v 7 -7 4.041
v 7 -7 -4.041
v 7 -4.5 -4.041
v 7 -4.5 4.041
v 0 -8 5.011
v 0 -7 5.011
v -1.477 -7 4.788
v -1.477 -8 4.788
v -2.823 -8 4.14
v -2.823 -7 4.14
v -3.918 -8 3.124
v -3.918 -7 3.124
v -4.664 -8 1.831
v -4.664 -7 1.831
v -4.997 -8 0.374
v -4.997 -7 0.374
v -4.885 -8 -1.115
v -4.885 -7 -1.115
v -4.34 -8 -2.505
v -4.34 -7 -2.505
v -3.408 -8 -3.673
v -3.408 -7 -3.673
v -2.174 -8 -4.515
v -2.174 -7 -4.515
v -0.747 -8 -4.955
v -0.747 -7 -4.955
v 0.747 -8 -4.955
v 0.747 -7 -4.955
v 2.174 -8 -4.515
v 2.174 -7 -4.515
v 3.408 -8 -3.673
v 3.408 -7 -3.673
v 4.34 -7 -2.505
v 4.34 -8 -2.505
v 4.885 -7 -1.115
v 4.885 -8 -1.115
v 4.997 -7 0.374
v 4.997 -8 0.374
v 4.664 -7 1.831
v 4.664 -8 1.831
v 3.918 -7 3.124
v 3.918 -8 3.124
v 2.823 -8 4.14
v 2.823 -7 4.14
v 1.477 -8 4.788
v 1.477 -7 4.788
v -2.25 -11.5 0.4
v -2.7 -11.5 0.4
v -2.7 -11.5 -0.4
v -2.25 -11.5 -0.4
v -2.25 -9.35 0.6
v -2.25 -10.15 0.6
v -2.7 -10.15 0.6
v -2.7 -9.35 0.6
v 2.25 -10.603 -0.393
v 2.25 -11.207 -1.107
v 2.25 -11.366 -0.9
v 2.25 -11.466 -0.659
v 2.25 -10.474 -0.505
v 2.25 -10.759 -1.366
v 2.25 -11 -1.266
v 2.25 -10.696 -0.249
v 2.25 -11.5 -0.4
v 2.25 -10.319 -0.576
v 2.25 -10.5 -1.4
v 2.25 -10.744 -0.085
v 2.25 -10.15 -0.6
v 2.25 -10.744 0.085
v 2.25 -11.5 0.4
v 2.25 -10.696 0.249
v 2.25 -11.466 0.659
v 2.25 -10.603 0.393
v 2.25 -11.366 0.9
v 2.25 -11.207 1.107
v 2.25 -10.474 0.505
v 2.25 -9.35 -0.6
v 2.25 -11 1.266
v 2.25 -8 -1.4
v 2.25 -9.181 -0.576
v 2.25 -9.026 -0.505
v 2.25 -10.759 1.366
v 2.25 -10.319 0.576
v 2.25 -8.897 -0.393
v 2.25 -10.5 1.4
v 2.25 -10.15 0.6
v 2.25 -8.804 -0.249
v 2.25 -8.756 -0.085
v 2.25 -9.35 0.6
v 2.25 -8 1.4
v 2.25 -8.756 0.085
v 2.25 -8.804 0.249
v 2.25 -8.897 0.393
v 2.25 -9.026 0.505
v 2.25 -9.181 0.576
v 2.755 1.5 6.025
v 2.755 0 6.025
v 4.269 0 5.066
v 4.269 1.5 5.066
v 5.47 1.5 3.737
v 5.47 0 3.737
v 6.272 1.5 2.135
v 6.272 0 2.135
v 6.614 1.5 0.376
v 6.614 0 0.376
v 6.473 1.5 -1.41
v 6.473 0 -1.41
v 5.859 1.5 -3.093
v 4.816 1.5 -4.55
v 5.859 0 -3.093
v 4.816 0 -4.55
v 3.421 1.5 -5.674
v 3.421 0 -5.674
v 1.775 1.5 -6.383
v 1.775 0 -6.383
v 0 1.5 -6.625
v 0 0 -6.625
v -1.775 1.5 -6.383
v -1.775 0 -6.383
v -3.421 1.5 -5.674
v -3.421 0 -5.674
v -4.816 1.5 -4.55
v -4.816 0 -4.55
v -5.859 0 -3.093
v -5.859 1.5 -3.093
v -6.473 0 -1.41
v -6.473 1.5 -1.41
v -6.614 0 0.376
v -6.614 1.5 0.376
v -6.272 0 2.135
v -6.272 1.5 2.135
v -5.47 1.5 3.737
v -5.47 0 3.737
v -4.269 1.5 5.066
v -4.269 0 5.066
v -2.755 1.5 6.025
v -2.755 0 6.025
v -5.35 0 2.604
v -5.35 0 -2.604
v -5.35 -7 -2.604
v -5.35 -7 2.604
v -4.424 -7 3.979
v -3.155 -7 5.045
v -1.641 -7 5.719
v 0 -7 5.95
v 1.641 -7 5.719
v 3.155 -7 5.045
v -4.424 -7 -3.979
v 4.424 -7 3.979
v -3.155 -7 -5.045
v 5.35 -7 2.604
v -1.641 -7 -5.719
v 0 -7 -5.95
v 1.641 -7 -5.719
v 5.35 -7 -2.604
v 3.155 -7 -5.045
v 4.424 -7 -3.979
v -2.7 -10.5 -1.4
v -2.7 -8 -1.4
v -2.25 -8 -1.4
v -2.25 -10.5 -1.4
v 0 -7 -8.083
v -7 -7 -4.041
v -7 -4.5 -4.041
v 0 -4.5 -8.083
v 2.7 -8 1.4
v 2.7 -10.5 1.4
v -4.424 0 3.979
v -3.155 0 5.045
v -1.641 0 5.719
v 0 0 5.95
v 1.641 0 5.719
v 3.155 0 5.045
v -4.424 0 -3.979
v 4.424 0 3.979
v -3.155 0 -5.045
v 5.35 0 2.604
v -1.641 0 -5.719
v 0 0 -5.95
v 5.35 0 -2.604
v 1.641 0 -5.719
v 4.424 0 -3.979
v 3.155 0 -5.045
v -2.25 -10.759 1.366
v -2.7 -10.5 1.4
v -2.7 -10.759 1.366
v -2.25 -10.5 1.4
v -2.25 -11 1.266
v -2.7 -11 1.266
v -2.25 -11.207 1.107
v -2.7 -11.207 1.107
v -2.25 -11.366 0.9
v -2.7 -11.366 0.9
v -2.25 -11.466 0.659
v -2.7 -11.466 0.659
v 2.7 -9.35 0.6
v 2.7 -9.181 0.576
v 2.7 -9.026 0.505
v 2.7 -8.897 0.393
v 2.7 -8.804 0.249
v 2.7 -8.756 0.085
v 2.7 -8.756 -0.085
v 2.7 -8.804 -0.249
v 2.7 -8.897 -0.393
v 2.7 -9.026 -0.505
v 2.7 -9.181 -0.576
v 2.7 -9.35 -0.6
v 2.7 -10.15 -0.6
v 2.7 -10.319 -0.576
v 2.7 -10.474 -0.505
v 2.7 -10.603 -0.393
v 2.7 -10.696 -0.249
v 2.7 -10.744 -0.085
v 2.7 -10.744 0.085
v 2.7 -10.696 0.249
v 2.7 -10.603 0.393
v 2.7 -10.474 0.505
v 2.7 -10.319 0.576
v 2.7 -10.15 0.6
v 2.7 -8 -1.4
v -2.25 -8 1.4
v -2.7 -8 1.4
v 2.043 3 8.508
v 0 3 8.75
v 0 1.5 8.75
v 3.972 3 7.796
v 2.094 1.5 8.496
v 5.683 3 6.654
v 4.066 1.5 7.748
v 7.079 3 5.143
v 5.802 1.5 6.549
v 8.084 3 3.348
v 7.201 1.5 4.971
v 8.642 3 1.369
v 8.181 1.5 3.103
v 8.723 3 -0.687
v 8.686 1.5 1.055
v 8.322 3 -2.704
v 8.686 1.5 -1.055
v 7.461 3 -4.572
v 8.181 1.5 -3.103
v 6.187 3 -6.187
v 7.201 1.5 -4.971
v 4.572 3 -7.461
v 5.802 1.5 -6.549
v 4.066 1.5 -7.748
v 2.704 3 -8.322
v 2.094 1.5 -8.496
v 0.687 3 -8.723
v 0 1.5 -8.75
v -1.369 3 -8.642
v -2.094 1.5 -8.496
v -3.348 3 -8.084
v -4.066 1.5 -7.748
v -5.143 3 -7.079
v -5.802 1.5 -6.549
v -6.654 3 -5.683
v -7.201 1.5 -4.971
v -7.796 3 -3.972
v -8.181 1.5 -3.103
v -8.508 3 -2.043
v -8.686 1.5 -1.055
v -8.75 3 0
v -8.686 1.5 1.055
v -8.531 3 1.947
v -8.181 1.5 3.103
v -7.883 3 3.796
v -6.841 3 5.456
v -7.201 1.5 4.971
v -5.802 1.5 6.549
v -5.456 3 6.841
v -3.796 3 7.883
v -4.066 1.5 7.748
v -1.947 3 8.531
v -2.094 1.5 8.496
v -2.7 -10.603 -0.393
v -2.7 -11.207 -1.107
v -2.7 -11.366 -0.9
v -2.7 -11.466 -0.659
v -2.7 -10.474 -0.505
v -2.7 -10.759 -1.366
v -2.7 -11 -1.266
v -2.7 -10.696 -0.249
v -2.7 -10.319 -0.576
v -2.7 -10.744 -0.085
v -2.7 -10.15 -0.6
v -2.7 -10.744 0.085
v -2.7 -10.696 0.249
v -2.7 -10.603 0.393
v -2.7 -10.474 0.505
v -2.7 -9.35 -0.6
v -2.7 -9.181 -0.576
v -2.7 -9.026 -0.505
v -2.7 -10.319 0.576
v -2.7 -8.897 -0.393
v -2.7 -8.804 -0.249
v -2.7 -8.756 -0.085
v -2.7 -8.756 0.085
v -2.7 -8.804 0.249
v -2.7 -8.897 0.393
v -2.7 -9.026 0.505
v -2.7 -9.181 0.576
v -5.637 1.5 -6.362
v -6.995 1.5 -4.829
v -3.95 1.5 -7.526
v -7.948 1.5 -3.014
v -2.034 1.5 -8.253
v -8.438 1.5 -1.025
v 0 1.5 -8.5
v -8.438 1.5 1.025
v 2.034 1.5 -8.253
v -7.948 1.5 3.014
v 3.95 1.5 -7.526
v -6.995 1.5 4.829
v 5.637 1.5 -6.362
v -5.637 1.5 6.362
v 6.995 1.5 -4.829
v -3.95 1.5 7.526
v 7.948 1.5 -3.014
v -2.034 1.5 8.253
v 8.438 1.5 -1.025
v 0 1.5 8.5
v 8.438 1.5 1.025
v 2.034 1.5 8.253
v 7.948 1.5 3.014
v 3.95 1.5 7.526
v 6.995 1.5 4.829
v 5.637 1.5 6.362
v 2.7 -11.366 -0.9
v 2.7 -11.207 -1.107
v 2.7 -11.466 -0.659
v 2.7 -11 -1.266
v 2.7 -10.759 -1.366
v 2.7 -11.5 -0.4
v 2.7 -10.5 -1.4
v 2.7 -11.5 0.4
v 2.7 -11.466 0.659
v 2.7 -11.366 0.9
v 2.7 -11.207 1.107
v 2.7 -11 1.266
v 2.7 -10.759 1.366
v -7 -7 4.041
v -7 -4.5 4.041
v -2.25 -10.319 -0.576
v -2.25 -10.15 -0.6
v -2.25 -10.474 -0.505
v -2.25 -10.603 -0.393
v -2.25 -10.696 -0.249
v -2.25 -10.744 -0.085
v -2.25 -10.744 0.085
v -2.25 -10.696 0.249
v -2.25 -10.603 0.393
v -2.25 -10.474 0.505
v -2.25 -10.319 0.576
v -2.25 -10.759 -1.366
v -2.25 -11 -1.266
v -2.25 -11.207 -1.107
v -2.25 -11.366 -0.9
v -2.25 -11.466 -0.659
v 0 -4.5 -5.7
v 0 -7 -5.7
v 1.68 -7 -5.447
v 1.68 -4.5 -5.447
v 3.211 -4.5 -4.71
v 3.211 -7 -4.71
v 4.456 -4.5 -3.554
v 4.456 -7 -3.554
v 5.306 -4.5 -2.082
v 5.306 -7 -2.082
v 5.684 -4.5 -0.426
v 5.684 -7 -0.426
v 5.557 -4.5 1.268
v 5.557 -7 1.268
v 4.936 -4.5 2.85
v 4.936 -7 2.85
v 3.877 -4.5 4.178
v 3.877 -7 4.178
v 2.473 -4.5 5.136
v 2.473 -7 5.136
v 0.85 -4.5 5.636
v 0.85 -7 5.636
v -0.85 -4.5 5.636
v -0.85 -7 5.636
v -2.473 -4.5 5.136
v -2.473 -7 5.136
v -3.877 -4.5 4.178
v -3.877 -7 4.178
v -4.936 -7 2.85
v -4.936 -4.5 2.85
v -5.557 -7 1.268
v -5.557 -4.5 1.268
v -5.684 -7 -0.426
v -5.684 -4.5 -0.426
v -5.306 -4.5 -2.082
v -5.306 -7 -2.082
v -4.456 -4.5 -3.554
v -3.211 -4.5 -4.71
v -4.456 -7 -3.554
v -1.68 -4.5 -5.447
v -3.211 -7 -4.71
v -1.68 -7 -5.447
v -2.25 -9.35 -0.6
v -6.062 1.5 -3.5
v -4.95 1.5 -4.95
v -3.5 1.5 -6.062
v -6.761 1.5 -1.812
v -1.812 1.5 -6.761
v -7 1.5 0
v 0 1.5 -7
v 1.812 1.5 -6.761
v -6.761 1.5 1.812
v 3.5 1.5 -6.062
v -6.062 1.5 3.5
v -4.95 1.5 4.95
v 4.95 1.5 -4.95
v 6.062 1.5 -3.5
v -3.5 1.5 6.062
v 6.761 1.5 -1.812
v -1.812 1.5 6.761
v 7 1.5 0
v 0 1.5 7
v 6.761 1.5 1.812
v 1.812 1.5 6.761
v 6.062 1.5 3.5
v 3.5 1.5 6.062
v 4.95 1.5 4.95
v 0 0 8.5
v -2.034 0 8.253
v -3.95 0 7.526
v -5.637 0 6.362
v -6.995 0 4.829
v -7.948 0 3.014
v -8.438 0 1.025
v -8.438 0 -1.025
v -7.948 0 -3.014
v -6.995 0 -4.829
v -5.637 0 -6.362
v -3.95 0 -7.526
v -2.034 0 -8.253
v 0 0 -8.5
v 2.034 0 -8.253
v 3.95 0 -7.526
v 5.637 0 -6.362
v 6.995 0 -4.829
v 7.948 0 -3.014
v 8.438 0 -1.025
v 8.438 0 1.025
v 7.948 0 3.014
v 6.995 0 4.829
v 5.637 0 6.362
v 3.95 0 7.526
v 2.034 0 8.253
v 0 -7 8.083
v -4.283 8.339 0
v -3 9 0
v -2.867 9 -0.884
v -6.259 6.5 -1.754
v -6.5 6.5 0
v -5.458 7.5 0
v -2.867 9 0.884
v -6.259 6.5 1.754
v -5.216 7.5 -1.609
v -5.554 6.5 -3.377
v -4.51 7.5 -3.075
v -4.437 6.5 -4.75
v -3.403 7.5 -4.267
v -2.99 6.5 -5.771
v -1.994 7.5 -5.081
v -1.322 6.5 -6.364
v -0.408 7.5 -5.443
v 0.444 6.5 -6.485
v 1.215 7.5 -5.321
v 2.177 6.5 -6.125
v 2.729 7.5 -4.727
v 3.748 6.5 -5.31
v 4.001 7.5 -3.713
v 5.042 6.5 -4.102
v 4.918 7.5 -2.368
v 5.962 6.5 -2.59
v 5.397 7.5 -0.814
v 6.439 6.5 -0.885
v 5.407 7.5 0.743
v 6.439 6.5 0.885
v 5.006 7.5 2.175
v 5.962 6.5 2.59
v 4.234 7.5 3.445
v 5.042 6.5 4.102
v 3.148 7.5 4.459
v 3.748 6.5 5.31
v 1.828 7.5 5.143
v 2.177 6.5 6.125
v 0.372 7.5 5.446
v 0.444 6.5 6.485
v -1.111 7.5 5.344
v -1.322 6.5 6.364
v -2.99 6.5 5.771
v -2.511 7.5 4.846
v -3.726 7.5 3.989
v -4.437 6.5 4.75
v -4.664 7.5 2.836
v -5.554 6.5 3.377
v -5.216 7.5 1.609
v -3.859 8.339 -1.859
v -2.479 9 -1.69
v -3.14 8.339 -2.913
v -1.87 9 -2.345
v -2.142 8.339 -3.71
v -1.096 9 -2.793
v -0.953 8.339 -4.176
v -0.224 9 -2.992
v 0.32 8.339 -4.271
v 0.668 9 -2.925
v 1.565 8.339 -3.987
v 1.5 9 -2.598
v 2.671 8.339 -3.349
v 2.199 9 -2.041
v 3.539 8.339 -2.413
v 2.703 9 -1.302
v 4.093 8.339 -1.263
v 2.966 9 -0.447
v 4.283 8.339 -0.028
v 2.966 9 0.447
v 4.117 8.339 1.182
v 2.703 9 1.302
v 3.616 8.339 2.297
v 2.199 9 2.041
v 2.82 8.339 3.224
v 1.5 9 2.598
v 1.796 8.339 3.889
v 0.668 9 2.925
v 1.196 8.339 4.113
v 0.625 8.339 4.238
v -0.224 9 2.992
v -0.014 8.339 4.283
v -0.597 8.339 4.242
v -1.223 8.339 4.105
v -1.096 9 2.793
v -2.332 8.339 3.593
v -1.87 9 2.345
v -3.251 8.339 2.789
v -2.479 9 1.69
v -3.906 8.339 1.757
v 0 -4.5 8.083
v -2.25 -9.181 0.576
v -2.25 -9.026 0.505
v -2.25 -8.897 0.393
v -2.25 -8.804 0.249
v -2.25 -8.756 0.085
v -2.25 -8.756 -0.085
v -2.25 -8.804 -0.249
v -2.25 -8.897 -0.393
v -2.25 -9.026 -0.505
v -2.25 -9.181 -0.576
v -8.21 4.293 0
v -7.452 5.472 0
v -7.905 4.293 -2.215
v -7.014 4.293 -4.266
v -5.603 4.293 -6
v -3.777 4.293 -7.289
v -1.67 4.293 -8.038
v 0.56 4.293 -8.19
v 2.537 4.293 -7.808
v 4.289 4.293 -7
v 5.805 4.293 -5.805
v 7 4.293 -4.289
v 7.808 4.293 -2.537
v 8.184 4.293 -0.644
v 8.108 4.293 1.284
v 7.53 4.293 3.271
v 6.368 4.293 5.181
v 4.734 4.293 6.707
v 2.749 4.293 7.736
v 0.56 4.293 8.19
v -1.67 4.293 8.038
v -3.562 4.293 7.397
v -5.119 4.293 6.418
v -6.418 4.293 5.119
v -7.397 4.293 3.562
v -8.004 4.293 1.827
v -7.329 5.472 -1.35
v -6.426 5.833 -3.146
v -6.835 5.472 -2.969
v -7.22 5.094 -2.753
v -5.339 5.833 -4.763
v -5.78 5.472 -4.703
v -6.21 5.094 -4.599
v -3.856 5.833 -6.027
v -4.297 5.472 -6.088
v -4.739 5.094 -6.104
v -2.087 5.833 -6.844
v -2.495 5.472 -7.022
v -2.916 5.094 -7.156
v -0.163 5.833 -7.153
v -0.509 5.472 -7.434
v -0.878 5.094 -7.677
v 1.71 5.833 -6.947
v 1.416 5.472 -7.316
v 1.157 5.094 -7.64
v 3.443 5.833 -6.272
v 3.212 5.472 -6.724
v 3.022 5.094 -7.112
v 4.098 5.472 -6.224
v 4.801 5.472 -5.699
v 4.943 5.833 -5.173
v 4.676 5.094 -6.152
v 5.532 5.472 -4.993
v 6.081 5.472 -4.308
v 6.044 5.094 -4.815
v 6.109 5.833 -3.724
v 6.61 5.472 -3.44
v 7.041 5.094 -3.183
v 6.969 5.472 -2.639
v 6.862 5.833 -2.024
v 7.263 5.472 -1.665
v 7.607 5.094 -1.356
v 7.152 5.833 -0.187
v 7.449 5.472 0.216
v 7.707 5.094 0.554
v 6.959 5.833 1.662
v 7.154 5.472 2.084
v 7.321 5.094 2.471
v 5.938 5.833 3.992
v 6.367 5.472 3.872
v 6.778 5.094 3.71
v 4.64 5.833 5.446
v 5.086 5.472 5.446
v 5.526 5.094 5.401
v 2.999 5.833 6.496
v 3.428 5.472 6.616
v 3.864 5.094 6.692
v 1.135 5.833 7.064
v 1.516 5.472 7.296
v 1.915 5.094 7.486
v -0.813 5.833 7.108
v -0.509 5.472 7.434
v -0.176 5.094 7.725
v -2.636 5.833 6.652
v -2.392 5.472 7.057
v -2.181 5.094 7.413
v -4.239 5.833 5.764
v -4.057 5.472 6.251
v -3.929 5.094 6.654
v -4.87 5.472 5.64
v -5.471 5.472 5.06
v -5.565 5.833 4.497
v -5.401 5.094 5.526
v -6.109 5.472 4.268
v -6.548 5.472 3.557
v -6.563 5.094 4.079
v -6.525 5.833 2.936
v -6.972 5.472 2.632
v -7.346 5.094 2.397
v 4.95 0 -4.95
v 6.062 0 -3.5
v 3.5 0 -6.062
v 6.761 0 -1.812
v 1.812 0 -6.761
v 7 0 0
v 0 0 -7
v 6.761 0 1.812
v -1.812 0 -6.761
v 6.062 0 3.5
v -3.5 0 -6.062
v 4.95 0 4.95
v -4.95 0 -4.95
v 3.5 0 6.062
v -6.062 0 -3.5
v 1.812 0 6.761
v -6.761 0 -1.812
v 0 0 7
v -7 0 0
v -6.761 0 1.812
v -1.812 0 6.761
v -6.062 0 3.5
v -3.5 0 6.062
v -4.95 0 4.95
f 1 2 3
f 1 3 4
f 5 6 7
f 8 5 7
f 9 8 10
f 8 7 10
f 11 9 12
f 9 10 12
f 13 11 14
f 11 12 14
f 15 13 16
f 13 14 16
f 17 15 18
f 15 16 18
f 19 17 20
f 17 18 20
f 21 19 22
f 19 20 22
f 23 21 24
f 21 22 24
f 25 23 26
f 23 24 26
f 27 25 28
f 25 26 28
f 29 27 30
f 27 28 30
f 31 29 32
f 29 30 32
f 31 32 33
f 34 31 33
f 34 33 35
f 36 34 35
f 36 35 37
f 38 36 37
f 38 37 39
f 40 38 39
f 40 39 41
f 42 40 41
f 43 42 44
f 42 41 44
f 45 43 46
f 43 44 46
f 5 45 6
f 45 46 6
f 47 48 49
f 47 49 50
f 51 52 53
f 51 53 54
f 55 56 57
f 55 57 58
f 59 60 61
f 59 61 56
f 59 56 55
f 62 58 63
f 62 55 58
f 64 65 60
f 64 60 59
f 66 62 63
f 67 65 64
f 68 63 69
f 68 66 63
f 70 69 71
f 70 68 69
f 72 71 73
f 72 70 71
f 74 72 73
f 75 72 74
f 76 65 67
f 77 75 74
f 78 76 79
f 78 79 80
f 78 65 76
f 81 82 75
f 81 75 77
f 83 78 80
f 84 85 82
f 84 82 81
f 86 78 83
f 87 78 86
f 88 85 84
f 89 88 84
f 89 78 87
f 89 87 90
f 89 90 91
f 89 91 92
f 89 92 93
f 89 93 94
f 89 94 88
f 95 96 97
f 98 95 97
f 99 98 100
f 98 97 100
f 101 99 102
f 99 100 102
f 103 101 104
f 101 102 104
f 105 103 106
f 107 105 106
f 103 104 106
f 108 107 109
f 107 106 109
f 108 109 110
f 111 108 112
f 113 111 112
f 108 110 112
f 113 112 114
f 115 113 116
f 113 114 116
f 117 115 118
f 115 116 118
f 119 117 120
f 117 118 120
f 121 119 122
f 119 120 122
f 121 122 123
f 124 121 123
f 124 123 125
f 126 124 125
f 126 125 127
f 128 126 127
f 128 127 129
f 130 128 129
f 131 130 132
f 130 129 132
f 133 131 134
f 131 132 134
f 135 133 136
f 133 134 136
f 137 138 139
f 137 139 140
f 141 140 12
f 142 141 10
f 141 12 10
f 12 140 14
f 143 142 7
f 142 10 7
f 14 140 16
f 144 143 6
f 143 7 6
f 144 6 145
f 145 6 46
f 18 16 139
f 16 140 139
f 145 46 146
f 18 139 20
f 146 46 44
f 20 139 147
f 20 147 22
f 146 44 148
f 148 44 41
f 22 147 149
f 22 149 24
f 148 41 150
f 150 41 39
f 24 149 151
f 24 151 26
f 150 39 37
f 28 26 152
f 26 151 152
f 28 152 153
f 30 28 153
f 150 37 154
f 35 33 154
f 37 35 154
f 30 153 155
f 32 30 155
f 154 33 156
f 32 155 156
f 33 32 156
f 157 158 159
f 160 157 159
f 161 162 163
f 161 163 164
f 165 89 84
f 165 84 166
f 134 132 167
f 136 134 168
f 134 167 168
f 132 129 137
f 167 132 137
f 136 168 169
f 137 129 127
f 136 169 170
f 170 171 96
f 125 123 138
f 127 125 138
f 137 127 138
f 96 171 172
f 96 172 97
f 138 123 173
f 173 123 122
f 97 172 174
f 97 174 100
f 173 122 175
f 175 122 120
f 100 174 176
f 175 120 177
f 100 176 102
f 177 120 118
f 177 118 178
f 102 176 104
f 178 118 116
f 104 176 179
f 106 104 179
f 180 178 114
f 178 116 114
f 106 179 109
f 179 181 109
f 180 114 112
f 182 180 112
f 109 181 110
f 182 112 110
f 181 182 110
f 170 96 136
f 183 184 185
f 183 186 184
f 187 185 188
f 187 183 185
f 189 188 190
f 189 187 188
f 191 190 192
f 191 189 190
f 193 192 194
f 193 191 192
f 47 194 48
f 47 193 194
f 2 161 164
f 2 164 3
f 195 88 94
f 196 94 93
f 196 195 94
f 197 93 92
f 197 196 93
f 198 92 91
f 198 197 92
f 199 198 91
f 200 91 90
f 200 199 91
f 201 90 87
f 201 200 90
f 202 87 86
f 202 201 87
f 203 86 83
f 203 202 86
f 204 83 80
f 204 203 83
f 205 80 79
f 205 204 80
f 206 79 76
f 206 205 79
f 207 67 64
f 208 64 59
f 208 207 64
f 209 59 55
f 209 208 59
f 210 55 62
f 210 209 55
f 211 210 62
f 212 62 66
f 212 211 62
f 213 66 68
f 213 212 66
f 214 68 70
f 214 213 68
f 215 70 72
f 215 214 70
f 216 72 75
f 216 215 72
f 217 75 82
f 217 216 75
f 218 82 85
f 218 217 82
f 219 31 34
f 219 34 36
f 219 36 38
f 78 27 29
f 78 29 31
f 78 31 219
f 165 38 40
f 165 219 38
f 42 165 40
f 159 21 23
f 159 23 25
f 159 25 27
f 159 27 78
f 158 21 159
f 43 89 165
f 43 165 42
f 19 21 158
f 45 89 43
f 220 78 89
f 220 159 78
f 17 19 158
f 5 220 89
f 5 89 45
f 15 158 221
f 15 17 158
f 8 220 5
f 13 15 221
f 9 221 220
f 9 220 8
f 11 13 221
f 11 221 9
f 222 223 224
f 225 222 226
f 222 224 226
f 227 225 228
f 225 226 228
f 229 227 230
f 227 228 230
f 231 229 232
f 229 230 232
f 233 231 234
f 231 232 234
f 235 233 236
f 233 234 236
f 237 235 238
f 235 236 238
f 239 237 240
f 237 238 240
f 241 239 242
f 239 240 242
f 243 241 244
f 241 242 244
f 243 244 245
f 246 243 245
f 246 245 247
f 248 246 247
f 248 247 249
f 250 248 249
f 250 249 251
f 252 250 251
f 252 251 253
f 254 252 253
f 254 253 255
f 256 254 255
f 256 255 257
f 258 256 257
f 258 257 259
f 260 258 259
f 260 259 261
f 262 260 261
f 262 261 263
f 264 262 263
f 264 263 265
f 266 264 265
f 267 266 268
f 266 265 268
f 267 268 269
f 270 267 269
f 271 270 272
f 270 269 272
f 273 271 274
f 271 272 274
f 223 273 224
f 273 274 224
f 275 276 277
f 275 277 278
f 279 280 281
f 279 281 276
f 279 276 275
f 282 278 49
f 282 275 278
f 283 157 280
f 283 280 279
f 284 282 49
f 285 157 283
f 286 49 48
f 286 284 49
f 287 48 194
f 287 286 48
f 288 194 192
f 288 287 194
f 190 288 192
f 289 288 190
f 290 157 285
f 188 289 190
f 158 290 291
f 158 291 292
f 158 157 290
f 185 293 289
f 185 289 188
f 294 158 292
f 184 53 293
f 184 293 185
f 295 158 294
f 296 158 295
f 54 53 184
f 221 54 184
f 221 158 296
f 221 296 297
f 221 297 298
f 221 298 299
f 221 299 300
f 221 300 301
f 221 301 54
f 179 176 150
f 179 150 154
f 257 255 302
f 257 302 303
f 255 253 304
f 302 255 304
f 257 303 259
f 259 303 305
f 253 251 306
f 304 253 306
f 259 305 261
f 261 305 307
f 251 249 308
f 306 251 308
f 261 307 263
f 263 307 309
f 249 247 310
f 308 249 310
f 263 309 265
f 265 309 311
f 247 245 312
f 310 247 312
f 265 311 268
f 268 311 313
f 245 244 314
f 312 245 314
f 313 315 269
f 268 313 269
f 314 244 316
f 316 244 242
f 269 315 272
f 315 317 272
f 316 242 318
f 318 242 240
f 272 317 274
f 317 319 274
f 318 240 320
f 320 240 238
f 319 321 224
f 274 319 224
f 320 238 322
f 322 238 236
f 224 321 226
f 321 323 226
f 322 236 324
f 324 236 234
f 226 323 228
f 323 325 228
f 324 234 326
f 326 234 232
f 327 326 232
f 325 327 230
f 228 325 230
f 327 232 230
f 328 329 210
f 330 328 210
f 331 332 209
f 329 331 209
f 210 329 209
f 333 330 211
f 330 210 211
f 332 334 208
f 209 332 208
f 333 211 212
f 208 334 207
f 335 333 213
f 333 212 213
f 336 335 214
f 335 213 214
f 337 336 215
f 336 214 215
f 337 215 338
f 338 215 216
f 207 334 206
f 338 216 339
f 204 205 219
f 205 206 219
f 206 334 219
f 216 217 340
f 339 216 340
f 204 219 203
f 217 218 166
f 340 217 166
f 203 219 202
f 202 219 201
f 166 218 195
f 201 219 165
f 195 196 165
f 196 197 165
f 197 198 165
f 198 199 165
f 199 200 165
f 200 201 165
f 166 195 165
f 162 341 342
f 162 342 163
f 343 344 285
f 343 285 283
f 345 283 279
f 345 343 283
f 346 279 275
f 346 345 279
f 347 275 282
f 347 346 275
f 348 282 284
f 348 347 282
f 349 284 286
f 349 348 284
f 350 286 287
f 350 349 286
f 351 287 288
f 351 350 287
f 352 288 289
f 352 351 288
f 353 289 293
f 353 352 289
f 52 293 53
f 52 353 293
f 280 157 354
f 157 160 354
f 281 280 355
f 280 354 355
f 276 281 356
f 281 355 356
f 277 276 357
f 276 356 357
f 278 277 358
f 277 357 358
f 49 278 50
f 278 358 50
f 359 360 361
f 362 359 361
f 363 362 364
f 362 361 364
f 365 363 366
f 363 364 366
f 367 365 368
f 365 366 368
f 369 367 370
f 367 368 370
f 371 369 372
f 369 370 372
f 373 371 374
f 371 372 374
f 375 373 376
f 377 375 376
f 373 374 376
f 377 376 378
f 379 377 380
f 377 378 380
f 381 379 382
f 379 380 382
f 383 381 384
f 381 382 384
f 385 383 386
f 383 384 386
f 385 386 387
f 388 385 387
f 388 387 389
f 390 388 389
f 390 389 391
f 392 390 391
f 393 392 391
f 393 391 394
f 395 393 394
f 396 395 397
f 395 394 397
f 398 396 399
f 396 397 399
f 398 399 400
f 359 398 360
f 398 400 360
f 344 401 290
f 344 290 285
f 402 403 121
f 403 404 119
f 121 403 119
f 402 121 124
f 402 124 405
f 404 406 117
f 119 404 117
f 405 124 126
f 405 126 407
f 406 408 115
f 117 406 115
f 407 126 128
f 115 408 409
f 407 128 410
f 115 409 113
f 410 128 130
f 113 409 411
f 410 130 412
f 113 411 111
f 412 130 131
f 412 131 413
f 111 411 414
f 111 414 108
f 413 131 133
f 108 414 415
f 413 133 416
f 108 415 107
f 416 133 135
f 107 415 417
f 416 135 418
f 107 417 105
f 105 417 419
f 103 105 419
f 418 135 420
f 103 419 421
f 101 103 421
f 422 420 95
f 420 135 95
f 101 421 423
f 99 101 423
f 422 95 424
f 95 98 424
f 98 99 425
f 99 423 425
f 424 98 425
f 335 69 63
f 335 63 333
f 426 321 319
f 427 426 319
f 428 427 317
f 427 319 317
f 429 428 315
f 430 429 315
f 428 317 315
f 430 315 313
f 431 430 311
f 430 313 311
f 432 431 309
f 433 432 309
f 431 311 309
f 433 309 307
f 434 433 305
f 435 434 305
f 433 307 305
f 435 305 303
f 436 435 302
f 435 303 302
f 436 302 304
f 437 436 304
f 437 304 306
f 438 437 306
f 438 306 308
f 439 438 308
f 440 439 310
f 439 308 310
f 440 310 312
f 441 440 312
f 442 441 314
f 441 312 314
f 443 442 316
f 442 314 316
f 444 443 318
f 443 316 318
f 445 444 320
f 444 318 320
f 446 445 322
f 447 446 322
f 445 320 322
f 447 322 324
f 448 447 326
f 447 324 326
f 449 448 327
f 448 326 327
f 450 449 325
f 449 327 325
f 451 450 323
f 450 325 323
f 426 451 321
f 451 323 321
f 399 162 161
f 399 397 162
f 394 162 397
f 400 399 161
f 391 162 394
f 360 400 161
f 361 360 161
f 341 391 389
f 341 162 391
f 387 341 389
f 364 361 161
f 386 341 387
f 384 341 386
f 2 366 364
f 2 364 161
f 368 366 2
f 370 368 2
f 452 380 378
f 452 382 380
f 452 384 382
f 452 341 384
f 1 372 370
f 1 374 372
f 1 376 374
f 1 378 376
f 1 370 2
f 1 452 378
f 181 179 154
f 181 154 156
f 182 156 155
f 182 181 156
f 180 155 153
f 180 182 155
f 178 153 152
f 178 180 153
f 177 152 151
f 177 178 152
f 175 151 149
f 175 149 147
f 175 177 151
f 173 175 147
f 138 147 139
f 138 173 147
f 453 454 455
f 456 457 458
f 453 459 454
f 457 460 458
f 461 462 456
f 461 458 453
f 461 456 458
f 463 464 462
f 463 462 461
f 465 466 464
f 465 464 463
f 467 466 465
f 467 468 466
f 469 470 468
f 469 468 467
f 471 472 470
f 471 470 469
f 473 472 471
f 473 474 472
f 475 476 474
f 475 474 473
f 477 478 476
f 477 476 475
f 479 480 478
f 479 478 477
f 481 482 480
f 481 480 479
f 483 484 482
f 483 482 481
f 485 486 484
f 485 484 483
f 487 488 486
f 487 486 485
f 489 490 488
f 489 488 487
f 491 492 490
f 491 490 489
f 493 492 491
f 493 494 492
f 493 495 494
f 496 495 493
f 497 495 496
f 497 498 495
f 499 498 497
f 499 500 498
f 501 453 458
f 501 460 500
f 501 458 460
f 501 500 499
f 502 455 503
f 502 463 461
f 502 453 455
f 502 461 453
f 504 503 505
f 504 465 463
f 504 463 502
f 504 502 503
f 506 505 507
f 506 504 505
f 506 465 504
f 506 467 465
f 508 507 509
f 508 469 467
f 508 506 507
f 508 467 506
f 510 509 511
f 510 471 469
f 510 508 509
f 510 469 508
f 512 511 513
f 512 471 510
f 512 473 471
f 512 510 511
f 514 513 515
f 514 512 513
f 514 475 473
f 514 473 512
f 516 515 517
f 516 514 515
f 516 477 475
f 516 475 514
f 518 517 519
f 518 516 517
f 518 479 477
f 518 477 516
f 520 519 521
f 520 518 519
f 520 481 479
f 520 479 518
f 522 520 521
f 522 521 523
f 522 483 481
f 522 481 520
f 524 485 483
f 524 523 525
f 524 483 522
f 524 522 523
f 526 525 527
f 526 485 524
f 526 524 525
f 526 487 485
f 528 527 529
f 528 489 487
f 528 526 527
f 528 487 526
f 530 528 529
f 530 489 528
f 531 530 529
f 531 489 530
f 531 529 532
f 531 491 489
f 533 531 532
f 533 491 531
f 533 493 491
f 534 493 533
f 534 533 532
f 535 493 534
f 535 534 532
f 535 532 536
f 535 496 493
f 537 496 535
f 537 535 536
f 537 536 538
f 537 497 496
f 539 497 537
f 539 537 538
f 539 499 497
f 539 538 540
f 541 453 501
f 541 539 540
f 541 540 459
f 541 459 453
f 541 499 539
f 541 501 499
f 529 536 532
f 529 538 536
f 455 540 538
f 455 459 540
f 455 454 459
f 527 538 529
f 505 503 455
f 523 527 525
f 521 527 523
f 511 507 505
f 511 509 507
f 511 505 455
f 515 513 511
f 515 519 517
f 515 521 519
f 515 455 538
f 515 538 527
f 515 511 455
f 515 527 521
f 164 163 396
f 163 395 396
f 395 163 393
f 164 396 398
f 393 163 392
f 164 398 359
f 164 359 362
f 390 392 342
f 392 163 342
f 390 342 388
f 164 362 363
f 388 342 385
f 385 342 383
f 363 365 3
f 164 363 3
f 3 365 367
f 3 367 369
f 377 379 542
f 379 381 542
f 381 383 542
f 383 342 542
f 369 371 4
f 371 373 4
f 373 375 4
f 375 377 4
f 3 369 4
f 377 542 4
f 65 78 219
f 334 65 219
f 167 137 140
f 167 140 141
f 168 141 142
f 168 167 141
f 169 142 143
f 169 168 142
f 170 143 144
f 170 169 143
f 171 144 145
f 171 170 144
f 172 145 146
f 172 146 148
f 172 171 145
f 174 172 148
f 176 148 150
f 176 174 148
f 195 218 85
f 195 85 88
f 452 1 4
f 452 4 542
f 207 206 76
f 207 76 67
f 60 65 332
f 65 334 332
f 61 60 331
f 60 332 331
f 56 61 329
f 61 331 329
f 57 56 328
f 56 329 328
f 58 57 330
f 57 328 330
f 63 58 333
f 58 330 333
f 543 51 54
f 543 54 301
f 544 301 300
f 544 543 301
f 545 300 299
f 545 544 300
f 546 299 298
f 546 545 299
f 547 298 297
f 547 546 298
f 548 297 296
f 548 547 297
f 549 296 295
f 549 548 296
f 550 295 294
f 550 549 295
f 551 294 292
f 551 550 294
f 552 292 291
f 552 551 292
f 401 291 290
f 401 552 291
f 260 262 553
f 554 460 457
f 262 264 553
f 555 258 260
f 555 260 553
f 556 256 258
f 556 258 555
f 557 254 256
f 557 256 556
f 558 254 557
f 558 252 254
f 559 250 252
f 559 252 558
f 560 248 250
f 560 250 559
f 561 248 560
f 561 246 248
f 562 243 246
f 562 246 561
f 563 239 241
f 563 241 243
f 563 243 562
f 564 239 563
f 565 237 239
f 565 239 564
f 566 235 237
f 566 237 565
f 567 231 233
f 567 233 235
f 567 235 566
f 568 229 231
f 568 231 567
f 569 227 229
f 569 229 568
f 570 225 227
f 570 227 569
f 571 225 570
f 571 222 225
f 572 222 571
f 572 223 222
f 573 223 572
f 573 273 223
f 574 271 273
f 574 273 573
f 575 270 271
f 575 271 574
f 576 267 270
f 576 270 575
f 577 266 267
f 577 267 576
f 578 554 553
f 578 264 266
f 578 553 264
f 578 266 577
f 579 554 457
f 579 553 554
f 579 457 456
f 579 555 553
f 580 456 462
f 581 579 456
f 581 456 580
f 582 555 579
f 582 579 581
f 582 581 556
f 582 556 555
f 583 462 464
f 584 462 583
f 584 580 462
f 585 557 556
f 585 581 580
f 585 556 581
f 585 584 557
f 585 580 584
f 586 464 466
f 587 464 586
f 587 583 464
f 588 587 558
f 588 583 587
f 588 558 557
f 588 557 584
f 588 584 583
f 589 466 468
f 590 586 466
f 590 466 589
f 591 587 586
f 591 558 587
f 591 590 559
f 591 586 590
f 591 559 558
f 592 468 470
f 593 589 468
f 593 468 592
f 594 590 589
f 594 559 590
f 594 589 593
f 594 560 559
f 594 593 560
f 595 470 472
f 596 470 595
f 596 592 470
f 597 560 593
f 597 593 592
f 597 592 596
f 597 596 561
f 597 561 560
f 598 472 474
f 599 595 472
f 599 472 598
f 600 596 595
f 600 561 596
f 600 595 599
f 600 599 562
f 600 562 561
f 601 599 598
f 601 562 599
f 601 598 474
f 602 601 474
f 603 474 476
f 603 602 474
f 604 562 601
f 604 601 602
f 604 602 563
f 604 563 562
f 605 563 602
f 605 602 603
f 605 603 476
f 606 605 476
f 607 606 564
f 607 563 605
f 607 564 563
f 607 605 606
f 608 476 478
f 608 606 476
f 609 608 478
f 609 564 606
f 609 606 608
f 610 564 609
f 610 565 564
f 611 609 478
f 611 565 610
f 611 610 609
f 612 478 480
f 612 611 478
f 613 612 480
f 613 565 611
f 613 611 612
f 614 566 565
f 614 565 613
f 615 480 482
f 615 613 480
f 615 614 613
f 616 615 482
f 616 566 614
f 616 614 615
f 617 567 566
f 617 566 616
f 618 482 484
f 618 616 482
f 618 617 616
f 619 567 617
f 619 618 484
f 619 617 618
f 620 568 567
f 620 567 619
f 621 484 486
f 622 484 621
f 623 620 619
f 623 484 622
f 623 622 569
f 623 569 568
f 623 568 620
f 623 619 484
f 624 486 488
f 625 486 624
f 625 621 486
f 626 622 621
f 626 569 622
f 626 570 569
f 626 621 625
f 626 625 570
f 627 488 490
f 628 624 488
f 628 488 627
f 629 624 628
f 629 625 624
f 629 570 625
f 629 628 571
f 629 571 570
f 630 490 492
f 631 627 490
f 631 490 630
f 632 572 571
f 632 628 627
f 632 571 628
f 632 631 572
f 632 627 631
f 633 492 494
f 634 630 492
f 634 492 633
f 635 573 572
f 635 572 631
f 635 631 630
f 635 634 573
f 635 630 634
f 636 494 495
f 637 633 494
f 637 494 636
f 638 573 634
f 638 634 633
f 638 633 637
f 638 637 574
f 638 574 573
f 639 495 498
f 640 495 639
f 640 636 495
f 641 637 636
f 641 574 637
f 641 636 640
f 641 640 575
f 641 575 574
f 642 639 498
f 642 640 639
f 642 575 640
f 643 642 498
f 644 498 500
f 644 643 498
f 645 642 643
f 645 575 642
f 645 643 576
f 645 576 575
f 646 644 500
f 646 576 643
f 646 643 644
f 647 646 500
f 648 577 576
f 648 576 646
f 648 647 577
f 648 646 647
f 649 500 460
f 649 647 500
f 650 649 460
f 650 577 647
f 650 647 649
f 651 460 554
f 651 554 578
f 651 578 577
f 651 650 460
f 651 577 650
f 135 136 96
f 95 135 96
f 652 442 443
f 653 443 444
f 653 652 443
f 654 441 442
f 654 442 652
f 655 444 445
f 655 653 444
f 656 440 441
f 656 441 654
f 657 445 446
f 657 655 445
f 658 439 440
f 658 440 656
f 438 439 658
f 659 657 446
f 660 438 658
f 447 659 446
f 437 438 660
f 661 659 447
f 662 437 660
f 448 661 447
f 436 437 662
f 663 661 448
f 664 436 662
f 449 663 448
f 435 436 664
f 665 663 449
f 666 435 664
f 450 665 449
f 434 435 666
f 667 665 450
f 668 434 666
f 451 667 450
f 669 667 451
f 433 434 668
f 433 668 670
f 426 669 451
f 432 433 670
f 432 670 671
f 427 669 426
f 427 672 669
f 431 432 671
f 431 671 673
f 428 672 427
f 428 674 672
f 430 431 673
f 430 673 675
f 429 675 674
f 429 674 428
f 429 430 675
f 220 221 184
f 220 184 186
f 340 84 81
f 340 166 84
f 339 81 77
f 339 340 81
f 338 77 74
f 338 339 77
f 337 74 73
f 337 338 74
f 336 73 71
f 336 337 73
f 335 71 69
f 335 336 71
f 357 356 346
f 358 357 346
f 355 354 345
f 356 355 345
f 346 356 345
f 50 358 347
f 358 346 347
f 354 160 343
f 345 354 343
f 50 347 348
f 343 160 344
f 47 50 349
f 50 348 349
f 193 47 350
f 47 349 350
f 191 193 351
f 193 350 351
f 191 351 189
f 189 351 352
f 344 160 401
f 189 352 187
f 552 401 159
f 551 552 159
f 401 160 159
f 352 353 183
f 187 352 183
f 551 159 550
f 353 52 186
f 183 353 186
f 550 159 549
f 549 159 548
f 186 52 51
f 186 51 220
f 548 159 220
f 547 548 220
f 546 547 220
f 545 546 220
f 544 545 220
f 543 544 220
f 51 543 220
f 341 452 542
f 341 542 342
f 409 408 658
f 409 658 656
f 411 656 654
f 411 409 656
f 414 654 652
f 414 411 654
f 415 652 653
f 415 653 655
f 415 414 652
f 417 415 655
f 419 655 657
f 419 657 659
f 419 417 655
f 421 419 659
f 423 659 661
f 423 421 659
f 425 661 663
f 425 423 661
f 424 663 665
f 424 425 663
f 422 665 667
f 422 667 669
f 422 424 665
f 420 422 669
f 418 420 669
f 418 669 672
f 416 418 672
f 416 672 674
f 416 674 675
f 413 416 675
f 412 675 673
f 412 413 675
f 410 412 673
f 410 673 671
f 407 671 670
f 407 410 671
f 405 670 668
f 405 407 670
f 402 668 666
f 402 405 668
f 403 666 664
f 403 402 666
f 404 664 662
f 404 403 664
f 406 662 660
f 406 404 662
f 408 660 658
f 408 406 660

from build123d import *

# Parameters (mm, degrees)
BOSS_EXTRUDE1_DEPTH = 7
BOSS_EXTRUDE2_DEPTH = 1.5
SKETCH3_R           = 8.75
BOSS_EXTRUDE3_DEPTH = 1.5
SKETCH5_R           = 5.010854022
BOSS_EXTRUDE4_DEPTH = 1
SKETCH6_W           = 0.45
SKETCH6_H           = 2.8
BOSS_EXTRUDE5_DEPTH = 3.5
CUT_EXTRUDE1_DEPTH  = 19.436783994
FILLET1_R           = 1
SKETCH8_R           = 8.5
SKETCH8_R_2         = 7
BOSS_EXTRUDE6_DEPTH = 1.5
SKETCH9_R           = 5.7
BOSS_EXTRUDE7_DEPTH = 2.5


with BuildPart() as part:
    # Sketch1 → Boss-Extrude1 (new body)
    with BuildSketch(Plane(origin=(0, 0, 0), x_dir=(1, 0, 0), z_dir=(0, 1, 0))):
        with BuildLine():
            Line((-5.35, 2.603843313), (-5.35, -2.603843313))
            ThreePointArc((-5.35, -2.603843313), (0, -5.95), (5.35, -2.603843313))
            Line((5.35, -2.603843313), (5.35, 2.603843313))
            ThreePointArc((5.35, 2.603843313), (0, 5.95), (-5.35, 2.603843313))
        make_face()
    extrude(amount=-BOSS_EXTRUDE1_DEPTH)

    # Sketch2 → Boss-Extrude2 (add)
    with BuildSketch(Plane(origin=(0, 0, 0), x_dir=(1, 0, 0), z_dir=(0, 1, 0))):
        with BuildLine():
            Line((-2.754995463, -6.025), (2.754995463, -6.025))
            ThreePointArc((2.754995463, -6.025), (0, 6.625), (-2.754995463, -6.025))
        make_face()
    extrude(amount=BOSS_EXTRUDE2_DEPTH)

    # Sketch3 → Boss-Extrude3 (add)
    with BuildSketch(Plane(origin=(0, 1.5, 0), x_dir=(1, 0, 0), z_dir=(0, 1, 0))):
        with Locations(Location((0, 0, 0), (0, 0, 270))):
            Circle(SKETCH3_R)
    extrude(amount=BOSS_EXTRUDE3_DEPTH)

    # Sketch4 → Revolve2 (revolve)
    with BuildSketch(Plane.XY):
        with BuildLine():
            Line((0, 1.5), (0, 6.5))
            Line((0, 6.5), (0, 9))
            Line((0, 9), (-3, 9))
            ThreePointArc((-3, 9), (-4.886002476, 7.940403467), (-6.5, 6.5))
            ThreePointArc((-6.5, 6.5), (-7.856528253, 4.898839592), (-8.75, 3))
            Line((-8.75, 3), (-8.75, 1.5))
            Line((-8.75, 1.5), (0, 1.5))
        make_face()
    revolve(axis=Axis((0, 1.5, 0), (0, -1, 0)))

    # Sketch5 → Boss-Extrude4 (add)
    with BuildSketch(Plane.XZ.offset(7)):
        with Locations(Location((0, 0, 0), (0, 0, 90))):
            Circle(SKETCH5_R)
    extrude(amount=BOSS_EXTRUDE4_DEPTH)

    # Sketch6 → Boss-Extrude5 (add)
    with BuildSketch(Plane.XZ.offset(8)):
        with Locations((-2.475, 0)):
            Rectangle(SKETCH6_W, SKETCH6_H)
        with Locations((2.475, 0)):
            Rectangle(SKETCH6_W, SKETCH6_H)
    extrude(amount=BOSS_EXTRUDE5_DEPTH)

    # Sketch7 → Cut-Extrude1 (cut, through all)
    with BuildSketch(Plane(origin=(2.7, 0, 0), x_dir=(0, 0, -1), z_dir=(1, 0, 0))):
        with BuildLine():
            Line((0.6, -9.35), (0.6, -10.15))
            ThreePointArc((0.6, -10.15), (0, -10.75), (-0.6, -10.15))
            Line((-0.6, -10.15), (-0.6, -9.35))
            ThreePointArc((-0.6, -9.35), (0, -8.75), (0.6, -9.35))
        make_face()
    extrude(amount=-CUT_EXTRUDE1_DEPTH, mode=Mode.SUBTRACT)

    # Fillet1
    fillet1_edges = [part.edges().sort_by_distance(p)[0] for p in [
        (-2.475, -11.5, -1.4),
        (-2.475, -11.5, 1.4),
        (2.475, -11.5, 1.4),
        (2.475, -11.5, -1.4),
    ]]
    fillet(fillet1_edges, radius=FILLET1_R)

    # Sketch8 → Boss-Extrude6 (add)
    with BuildSketch(Plane.XZ.offset(-1.5)):
        with Locations(Location((0, 0, 0), (0, 0, 90))):
            Circle(SKETCH8_R)
        with Locations(Location((0, 0, 0), (0, 0, 270))):
            Circle(SKETCH8_R_2, mode=Mode.SUBTRACT)
    extrude(amount=BOSS_EXTRUDE6_DEPTH)


with BuildPart() as body_2:
    # Sketch9 → Boss-Extrude7 (new body)
    with BuildSketch(Plane.XZ.offset(7)):
        Polygon((0, -8.082903769), (7, -4.041451884), (7, 4.041451884), (0, 8.082903769), (-7, 4.041451884), (-7, -4.041451884), align=None)
        with Locations(Location((0, 0, 0), (0, 0, 270))):
            Circle(SKETCH9_R, mode=Mode.SUBTRACT)
    extrude(amount=-BOSS_EXTRUDE7_DEPTH)


solid = Compound([part.part, body_2.part])
